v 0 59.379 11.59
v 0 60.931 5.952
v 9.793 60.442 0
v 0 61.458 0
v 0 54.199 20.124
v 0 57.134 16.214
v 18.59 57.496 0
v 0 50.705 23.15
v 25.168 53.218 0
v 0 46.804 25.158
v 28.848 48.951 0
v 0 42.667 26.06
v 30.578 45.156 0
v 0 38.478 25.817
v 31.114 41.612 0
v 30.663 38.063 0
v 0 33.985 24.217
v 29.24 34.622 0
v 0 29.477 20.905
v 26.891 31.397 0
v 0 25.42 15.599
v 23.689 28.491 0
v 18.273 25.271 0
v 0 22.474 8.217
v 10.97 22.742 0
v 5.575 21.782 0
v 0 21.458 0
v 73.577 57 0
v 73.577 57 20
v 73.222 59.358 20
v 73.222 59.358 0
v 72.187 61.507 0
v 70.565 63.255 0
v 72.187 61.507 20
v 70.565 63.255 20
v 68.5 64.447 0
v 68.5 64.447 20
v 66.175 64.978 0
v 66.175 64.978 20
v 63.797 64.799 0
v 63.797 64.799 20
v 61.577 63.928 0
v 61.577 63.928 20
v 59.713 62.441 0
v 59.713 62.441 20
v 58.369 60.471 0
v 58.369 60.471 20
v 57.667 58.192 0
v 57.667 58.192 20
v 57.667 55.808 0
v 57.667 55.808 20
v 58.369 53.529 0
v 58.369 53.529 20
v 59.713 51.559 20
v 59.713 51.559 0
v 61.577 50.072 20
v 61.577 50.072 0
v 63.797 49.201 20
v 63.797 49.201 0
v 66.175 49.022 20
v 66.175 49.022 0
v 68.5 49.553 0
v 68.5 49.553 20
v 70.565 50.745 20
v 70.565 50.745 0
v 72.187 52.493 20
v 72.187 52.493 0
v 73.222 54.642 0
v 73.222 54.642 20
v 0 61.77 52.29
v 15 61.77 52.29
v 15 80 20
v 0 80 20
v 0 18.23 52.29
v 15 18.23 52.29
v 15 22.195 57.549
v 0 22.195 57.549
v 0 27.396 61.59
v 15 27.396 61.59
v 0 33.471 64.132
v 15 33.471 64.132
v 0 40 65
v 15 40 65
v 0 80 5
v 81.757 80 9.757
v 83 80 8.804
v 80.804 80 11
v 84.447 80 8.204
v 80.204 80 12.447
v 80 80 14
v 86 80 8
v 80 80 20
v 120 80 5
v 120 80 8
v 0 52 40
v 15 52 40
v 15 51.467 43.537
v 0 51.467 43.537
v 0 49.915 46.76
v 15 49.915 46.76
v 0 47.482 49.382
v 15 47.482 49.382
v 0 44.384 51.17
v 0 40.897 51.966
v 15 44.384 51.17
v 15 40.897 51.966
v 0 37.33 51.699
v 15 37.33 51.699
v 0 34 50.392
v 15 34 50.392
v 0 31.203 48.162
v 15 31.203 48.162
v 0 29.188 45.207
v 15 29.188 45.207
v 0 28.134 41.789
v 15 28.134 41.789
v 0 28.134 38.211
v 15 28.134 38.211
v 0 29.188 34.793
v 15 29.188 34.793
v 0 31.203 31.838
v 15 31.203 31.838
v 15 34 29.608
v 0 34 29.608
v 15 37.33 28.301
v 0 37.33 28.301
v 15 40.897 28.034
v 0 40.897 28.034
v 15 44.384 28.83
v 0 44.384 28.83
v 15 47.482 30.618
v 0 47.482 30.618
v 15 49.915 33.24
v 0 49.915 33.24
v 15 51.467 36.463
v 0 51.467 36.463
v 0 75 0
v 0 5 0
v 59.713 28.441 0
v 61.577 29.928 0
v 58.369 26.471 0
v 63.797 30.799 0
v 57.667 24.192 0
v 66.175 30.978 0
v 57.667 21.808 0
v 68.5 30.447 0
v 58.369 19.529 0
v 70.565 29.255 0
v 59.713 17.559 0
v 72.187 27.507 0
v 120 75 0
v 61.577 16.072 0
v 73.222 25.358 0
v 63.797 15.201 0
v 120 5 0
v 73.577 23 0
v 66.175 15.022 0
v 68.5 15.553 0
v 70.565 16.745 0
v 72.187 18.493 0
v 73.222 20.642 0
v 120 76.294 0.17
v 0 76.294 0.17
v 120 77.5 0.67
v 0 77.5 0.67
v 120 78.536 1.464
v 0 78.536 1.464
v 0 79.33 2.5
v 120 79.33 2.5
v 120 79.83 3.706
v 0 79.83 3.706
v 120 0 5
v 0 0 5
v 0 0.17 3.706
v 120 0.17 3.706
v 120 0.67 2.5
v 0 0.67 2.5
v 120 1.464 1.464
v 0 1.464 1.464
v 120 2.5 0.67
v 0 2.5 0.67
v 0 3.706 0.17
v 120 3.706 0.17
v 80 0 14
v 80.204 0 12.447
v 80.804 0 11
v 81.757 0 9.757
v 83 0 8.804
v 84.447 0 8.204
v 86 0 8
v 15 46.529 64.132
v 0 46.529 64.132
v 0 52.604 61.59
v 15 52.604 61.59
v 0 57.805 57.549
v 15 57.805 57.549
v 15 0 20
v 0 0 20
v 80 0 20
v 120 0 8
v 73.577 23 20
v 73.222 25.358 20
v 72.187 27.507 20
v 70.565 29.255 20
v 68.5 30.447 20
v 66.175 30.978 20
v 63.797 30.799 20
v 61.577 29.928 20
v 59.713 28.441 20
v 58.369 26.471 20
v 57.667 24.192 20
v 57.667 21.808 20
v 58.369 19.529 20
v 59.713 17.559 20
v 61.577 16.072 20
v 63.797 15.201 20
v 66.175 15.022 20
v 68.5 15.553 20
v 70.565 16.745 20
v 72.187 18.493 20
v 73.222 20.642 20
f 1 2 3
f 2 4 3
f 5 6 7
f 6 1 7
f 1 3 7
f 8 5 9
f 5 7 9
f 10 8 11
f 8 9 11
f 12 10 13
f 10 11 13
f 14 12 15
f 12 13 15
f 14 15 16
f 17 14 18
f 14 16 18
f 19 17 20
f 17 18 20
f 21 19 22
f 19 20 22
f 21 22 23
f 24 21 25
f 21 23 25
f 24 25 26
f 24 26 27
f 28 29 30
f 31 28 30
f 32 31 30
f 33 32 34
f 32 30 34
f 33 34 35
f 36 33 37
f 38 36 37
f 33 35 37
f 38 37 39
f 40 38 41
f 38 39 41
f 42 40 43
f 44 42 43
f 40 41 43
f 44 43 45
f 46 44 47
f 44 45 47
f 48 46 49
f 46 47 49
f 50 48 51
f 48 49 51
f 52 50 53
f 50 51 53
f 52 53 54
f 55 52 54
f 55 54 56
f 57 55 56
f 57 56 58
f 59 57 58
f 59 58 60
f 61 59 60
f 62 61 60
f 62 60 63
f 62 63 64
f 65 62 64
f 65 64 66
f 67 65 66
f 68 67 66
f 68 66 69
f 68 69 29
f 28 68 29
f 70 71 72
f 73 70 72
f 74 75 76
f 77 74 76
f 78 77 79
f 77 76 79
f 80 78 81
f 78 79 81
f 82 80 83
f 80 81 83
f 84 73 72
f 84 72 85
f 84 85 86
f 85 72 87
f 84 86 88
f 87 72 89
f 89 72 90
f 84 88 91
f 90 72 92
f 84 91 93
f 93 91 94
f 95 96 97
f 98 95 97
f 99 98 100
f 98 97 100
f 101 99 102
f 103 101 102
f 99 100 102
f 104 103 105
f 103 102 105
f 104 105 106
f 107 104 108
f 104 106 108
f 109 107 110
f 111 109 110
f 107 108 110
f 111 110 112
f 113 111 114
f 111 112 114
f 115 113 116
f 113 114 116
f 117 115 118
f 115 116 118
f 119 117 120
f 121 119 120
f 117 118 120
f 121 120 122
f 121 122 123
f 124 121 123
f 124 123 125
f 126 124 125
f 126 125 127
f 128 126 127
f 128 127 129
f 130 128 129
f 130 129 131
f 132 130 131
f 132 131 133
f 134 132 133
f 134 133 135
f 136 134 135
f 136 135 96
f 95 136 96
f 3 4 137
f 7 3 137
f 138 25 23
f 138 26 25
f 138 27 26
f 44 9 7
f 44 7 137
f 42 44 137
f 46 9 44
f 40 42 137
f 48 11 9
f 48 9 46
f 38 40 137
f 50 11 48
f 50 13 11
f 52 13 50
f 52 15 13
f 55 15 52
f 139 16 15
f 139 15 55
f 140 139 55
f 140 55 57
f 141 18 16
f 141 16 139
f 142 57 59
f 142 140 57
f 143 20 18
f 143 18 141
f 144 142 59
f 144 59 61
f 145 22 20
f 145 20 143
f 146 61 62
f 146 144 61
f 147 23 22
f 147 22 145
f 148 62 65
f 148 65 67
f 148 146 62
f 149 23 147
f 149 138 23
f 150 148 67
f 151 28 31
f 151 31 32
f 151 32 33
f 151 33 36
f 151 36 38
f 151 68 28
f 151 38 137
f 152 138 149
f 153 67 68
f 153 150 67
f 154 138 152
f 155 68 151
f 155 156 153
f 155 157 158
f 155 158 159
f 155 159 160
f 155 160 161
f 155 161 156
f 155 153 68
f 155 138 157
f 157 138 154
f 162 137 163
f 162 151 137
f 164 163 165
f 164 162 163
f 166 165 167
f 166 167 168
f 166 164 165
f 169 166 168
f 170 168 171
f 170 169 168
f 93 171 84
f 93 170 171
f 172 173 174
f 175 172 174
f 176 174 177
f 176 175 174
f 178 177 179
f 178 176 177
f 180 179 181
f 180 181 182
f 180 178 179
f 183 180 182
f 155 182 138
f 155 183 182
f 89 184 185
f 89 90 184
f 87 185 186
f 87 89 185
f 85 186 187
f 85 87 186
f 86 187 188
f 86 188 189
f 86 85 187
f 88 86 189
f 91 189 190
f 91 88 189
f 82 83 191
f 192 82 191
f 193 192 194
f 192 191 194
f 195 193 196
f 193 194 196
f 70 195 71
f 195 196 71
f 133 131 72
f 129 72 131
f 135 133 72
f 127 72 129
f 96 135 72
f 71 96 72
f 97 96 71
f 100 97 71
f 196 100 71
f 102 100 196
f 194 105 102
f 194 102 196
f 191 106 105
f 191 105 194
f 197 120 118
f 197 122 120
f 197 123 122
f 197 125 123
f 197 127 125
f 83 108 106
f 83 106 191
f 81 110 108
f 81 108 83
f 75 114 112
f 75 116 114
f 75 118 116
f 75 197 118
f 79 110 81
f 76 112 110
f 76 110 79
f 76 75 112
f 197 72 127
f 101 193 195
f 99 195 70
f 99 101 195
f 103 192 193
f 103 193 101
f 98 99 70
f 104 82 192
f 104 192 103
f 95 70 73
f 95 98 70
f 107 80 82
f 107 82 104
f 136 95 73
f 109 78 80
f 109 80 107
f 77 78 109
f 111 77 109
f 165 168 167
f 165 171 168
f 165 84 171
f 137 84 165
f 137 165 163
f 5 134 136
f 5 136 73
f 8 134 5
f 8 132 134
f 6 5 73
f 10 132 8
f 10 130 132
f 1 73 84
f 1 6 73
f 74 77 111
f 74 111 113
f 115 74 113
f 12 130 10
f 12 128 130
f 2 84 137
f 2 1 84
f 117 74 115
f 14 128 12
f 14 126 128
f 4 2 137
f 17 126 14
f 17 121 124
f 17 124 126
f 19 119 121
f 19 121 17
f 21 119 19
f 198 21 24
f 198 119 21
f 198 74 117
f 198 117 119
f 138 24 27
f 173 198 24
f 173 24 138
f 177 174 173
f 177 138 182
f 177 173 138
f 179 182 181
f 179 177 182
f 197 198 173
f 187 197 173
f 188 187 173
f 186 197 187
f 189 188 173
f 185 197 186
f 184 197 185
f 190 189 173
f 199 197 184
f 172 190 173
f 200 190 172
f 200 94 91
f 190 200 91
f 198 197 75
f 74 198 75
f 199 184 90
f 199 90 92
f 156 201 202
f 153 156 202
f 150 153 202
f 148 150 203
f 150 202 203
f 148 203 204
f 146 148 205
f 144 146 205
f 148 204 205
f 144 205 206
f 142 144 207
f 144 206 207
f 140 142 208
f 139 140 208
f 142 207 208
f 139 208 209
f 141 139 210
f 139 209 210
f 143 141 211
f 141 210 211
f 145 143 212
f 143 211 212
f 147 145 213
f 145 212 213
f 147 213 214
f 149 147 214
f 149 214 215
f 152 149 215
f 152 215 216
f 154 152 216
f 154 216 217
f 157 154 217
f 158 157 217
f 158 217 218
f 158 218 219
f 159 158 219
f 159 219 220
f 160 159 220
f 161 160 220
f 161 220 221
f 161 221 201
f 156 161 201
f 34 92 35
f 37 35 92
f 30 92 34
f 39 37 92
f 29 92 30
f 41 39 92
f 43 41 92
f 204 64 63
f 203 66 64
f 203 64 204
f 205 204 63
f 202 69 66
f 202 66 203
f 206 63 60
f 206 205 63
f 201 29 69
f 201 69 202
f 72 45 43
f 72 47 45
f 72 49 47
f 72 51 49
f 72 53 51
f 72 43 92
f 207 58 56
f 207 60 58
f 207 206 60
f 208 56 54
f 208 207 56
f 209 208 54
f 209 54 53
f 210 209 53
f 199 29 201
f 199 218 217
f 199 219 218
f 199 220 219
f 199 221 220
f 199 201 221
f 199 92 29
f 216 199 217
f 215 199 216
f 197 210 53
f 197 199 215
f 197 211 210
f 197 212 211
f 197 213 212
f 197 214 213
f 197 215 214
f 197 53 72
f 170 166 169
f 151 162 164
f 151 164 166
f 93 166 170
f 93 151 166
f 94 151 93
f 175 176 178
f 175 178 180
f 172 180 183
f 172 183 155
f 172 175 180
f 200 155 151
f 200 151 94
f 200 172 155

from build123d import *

# Parameters (mm, degrees)
F1_DEPTH  = 80
F2_R      = 12
F3_DEPTH  = 25
F5_R      = 20
F6_DEPTH  = 50
F7_R      = 6
F8_R      = 5
F9_R      = 8
F10_DEPTH = 20.001


with BuildPart() as f1:
    # F0 (on Front) → F1 (new body)
    with BuildSketch(Plane.XZ):
        Polygon((0, 65), (0, 0), (120, 0), (120, 8), (80, 8), (80, 20), (15, 20), (15, 65), align=None)
    extrude(amount=-F1_DEPTH)

    # F2 (on face) → F3 (cut)
    with BuildSketch(Plane.YZ.offset(15)):
        with BuildLine():
            Line((0, 65), (0, 20))
            Line((0, 20), (18.2297518911, 52.2904962177))
            ThreePointArc((18.2297518911, 52.2904962177), (27.3956833871, 61.5900718554), (40, 65))
            Line((40, 65), (0, 65))
        make_face()
        with BuildLine():
            Line((61.7702481089, 52.2904962177), (80, 20))
            Line((80, 20), (80, 65))
            Line((80, 65), (40, 65))
            ThreePointArc((40, 65), (52.6043166129, 61.5900718554), (61.7702481089, 52.2904962177))
        make_face()
        with Locations((40, 40)):
            Circle(F2_R)
    extrude(amount=-F3_DEPTH, mode=Mode.SUBTRACT)

    # F5 (on face) → F6 (cut, symmetric)
    with BuildSketch(Plane(origin=(0, 0, 0), x_dir=(0, 1, 0), z_dir=(0.7660444431, 0, -0.6427876097))):
        with Locations((41.4580069482, 0)):
            Circle(F5_R)
    extrude(amount=F6_DEPTH, both=True, mode=Mode.SUBTRACT)

    # F7
    f7_edges = [f1.edges().sort_by_distance(p)[0] for p in [
        (80, 40, 8),
    ]]
    fillet(f7_edges, radius=F7_R)

    # F8
    f8_edges = [f1.edges().sort_by_distance(p)[0] for p in [
        (60, 0, 0),
        (60, 80, 0),
    ]]
    fillet(f8_edges, radius=F8_R)

    # F9 (on face) → F10 (cut, through all)
    with BuildSketch(Plane.XY.offset(20)):
        with Locations((65.5771933797, 57)):
            Circle(F9_R)
        with Locations((65.5771933797, 23)):
            Circle(F9_R)
    extrude(amount=-F10_DEPTH, mode=Mode.SUBTRACT)


solid = f1.part
